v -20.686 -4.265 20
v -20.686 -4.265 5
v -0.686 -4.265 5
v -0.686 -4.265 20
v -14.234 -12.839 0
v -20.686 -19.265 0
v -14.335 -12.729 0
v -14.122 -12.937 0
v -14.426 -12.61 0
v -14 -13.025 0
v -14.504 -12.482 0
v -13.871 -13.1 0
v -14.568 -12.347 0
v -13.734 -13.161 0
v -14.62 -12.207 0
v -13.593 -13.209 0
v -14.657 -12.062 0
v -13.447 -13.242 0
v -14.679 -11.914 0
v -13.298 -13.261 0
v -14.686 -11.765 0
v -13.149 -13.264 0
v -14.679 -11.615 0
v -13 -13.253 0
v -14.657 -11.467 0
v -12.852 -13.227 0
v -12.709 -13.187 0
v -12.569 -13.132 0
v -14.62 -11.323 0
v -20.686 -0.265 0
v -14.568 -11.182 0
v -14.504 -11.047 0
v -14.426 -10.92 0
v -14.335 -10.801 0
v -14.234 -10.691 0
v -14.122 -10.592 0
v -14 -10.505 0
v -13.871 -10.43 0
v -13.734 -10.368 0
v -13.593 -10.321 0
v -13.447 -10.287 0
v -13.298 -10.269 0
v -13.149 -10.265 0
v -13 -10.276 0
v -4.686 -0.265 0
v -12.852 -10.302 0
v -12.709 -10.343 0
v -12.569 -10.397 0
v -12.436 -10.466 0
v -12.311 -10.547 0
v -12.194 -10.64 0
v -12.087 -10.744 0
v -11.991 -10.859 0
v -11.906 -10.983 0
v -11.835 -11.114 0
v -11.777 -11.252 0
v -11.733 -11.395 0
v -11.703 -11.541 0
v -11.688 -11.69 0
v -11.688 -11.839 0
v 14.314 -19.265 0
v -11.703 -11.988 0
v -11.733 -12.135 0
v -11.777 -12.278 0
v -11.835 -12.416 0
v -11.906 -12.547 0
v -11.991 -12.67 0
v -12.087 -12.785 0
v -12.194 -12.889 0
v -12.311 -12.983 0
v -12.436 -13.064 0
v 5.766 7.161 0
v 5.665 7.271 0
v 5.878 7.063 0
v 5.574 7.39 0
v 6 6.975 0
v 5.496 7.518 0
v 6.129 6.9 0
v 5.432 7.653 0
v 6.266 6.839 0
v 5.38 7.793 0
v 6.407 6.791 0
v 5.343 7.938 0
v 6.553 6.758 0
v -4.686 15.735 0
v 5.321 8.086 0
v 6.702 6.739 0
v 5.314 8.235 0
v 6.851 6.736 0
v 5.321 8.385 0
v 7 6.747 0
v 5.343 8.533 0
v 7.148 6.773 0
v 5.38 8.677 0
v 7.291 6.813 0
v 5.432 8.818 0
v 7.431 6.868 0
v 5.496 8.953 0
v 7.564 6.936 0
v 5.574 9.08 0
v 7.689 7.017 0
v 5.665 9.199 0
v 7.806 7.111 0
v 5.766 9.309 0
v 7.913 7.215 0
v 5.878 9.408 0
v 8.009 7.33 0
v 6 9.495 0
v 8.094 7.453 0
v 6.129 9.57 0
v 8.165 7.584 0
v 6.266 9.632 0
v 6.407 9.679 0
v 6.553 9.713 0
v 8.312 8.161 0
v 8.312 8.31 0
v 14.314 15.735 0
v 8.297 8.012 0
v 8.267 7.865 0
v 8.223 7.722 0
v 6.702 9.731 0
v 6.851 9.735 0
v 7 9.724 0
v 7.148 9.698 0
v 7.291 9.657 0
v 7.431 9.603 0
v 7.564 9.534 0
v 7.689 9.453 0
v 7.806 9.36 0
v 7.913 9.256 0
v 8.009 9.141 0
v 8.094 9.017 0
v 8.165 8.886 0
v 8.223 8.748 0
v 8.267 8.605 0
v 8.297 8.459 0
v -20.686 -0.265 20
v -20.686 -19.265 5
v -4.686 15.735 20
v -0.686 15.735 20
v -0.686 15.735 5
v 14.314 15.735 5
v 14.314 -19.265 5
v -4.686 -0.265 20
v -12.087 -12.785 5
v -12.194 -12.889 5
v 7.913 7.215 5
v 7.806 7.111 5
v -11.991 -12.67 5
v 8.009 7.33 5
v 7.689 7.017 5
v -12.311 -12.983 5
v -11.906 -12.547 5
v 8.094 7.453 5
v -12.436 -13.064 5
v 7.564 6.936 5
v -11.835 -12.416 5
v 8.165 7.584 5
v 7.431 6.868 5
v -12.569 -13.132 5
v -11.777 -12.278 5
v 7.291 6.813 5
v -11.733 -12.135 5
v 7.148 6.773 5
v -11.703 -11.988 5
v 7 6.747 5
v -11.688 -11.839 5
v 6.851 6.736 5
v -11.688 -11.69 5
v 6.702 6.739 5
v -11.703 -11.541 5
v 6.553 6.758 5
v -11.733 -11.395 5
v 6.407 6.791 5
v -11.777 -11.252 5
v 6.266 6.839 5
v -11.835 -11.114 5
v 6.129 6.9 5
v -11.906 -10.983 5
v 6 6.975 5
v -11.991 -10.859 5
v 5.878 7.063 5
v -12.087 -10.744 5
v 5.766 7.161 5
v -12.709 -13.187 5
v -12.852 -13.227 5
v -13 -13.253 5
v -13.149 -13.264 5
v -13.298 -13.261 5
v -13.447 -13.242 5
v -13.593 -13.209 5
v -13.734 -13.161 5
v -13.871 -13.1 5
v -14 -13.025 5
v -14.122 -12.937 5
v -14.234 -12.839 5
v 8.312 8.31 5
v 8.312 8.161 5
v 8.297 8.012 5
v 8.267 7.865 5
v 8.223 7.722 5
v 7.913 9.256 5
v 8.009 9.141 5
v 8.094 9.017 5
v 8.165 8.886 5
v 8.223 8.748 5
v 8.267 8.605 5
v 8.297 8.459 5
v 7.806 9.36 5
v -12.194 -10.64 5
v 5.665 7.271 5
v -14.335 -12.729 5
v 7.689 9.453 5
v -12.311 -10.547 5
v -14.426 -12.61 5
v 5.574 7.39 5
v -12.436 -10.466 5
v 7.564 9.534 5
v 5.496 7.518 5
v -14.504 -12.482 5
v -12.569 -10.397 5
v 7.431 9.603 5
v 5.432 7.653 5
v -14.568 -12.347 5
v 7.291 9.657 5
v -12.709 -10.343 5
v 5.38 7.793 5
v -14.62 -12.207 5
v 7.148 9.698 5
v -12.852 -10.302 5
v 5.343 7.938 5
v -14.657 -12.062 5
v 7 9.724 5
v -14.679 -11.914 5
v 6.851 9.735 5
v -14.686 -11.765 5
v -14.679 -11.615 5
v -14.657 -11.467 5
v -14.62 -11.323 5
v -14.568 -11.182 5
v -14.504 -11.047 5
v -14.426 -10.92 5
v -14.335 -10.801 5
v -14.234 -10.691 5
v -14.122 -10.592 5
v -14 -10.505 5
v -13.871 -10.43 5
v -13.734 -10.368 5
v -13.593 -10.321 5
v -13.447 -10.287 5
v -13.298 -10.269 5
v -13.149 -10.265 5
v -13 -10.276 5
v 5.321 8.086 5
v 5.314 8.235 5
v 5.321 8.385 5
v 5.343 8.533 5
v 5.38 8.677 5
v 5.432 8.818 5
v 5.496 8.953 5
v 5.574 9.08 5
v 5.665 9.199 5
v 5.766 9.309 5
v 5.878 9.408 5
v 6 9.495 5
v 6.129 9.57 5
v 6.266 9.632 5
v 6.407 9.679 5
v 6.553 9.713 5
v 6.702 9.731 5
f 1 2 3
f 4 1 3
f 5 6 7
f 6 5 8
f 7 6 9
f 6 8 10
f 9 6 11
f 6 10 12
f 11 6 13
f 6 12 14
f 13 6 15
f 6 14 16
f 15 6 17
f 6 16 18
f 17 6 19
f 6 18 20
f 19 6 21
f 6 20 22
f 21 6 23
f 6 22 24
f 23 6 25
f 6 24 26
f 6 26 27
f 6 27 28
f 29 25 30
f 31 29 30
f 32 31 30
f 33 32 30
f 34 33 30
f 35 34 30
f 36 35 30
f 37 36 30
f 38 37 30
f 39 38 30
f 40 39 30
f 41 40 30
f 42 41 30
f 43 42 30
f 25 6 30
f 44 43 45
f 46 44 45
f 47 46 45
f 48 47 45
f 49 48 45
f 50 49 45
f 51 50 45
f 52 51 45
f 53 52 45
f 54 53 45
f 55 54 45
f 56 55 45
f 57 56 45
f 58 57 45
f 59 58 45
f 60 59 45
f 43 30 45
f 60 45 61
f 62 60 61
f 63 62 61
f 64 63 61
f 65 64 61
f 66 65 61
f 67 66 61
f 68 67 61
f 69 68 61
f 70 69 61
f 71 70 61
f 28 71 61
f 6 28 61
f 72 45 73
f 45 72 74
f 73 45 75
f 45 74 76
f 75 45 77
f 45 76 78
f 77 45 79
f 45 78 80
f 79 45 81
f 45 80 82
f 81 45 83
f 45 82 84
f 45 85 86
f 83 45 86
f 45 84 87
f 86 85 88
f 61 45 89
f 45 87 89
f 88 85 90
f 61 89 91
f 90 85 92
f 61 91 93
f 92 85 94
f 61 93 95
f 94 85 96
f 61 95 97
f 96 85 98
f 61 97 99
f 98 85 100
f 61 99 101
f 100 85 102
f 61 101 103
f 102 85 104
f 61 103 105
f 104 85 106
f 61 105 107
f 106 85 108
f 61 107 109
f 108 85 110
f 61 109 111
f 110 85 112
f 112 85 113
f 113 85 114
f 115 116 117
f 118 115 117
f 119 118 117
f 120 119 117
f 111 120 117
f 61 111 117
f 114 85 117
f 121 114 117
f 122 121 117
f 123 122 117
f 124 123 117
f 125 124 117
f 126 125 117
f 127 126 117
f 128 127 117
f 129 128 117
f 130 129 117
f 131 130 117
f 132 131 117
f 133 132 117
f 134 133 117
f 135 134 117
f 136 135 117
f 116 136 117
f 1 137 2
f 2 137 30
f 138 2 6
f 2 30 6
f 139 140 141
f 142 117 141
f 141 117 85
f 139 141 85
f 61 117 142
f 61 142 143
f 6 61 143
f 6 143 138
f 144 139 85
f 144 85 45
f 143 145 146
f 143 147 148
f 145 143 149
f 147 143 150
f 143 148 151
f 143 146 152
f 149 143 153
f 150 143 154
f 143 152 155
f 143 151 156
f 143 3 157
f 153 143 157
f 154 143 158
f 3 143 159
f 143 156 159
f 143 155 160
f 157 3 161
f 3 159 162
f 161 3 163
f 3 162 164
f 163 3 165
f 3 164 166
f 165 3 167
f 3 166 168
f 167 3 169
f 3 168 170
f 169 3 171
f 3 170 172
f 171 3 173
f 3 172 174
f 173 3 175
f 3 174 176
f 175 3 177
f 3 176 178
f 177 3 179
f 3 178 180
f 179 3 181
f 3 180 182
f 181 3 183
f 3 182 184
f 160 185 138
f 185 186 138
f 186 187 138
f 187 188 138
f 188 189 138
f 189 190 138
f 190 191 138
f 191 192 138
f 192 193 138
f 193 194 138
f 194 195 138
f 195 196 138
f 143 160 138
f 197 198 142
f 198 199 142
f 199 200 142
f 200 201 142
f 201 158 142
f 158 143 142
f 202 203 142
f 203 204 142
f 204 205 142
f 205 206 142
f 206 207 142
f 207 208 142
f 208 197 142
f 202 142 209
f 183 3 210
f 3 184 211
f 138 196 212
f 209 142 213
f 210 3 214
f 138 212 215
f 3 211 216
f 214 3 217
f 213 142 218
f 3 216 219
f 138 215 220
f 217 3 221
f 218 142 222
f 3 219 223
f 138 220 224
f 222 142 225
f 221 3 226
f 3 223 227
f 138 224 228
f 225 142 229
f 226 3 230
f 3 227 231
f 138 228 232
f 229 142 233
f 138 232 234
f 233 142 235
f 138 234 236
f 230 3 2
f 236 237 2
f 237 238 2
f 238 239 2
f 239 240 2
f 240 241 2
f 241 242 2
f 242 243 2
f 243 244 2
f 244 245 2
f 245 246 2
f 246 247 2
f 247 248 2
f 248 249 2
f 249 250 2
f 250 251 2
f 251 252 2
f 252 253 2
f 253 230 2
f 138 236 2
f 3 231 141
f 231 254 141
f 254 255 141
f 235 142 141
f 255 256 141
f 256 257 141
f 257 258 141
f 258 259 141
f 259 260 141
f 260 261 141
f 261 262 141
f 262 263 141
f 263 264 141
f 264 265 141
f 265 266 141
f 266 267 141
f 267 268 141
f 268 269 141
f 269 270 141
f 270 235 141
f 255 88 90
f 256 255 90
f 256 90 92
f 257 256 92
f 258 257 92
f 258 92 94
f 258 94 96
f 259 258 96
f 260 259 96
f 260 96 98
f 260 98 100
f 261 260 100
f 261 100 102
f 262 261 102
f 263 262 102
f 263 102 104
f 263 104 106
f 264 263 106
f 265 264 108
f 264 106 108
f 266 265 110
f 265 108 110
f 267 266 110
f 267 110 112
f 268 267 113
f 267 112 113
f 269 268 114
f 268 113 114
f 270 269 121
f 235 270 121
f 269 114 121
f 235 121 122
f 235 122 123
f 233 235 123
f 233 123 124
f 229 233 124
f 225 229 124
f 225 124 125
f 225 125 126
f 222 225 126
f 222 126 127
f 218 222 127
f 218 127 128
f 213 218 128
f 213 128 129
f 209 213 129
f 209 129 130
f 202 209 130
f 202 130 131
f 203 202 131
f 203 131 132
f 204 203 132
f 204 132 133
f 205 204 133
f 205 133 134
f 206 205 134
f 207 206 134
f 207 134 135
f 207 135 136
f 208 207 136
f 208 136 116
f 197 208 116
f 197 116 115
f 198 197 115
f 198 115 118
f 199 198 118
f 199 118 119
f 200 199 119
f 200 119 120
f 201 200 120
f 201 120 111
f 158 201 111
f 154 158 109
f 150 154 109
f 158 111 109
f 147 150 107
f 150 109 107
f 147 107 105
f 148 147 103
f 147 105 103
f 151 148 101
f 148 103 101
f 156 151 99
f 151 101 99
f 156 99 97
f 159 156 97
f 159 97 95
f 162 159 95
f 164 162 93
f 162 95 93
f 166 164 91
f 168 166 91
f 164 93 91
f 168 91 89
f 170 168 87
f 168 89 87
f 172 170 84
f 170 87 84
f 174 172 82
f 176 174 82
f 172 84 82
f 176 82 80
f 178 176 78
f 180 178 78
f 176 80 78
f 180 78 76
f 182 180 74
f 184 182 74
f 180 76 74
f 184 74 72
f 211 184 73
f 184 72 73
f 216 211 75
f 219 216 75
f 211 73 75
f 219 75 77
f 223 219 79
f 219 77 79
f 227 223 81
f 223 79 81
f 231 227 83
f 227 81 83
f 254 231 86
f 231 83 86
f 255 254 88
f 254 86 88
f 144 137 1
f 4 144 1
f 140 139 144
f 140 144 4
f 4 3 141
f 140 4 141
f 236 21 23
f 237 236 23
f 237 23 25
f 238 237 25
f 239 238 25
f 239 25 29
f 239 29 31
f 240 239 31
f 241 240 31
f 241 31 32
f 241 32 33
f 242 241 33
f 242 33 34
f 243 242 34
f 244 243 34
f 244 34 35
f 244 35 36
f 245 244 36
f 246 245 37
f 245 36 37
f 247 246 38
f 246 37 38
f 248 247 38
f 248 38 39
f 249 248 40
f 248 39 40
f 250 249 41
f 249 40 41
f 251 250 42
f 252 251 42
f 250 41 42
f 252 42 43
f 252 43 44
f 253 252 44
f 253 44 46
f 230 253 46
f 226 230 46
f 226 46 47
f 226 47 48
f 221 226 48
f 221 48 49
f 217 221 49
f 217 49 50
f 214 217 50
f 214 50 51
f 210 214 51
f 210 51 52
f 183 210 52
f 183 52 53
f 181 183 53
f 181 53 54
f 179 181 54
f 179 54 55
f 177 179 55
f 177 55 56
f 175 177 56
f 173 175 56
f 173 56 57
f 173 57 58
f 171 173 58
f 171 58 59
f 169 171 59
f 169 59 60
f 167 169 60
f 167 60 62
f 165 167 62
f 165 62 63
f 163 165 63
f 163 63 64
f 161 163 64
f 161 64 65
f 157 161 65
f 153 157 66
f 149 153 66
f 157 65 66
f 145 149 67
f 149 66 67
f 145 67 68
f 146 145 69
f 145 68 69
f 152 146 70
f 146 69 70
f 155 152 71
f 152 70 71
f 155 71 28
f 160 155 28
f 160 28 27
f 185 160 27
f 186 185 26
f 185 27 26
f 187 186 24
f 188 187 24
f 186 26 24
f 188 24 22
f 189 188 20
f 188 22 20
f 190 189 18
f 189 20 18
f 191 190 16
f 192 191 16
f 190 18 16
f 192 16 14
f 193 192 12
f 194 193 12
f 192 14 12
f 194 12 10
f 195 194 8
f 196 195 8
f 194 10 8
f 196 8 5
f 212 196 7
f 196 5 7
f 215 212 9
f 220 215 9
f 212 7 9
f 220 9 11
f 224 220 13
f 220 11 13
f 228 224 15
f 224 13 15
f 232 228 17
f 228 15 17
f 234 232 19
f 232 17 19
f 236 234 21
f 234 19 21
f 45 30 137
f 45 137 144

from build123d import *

# Parameters (mm, degrees)
BOSS_EXTRUDE1_DEPTH = 5
BOSS_EXTRUDE2_DEPTH = 20
SKETCH3_W           = 20
SKETCH3_H           = 15
CUT_EXTRUDE1_DEPTH  = 21
SKETCH4_R           = 1.5
CUT_EXTRUDE2_DEPTH  = 21


with BuildPart() as part:
    # Sketch1 → Boss-Extrude1 (new body)
    with BuildSketch(Plane.XY):
        Polygon((14.31372549, -4.264705882), (34.31372549, -4.264705882), (34.31372549, -19.264705882), (-20.68627451, -19.264705882), (-20.68627451, -4.264705882), (-0.68627451, -4.264705882), (-0.68627451, 15.735294118), (14.31372549, 15.735294118), align=None)
    extrude(amount=BOSS_EXTRUDE1_DEPTH)

    # Sketch2 → Boss-Extrude2 (add)
    with BuildSketch(Plane(origin=(0, 0, 0), x_dir=(-1, 0, 0), z_dir=(0, 0, -1))):
        Polygon((0.68627451, 15.735294118), (4.68627451, 15.735294118), (4.68627451, -0.264705882), (6.079970528, -0.264705882), (20.68627451, -0.264705882), (20.68627451, -4.264705882), (0.68627451, -4.264705882), align=None)
    extrude(amount=-BOSS_EXTRUDE2_DEPTH)

    # Sketch3 → Cut-Extrude1 (cut, through all)
    with BuildSketch(Plane(origin=(0, 0, 0), x_dir=(-1, 0, 0), z_dir=(0, 0, -1))):
        with Locations((-24.31372549, -11.764705882)):
            Rectangle(SKETCH3_W, SKETCH3_H)
    extrude(amount=-CUT_EXTRUDE1_DEPTH, mode=Mode.SUBTRACT)

    # Sketch4 → Cut-Extrude2 (cut, through all)
    with BuildSketch(Plane(origin=(0, 0, 0), x_dir=(-1, 0, 0), z_dir=(0, 0, -1))):
        with Locations((-6.81372549, 8.235294118)):
            Circle(SKETCH4_R)
        with Locations((13.18627451, -11.764705882)):
            Circle(SKETCH4_R)
    extrude(amount=-CUT_EXTRUDE2_DEPTH, mode=Mode.SUBTRACT)


solid = part.part
